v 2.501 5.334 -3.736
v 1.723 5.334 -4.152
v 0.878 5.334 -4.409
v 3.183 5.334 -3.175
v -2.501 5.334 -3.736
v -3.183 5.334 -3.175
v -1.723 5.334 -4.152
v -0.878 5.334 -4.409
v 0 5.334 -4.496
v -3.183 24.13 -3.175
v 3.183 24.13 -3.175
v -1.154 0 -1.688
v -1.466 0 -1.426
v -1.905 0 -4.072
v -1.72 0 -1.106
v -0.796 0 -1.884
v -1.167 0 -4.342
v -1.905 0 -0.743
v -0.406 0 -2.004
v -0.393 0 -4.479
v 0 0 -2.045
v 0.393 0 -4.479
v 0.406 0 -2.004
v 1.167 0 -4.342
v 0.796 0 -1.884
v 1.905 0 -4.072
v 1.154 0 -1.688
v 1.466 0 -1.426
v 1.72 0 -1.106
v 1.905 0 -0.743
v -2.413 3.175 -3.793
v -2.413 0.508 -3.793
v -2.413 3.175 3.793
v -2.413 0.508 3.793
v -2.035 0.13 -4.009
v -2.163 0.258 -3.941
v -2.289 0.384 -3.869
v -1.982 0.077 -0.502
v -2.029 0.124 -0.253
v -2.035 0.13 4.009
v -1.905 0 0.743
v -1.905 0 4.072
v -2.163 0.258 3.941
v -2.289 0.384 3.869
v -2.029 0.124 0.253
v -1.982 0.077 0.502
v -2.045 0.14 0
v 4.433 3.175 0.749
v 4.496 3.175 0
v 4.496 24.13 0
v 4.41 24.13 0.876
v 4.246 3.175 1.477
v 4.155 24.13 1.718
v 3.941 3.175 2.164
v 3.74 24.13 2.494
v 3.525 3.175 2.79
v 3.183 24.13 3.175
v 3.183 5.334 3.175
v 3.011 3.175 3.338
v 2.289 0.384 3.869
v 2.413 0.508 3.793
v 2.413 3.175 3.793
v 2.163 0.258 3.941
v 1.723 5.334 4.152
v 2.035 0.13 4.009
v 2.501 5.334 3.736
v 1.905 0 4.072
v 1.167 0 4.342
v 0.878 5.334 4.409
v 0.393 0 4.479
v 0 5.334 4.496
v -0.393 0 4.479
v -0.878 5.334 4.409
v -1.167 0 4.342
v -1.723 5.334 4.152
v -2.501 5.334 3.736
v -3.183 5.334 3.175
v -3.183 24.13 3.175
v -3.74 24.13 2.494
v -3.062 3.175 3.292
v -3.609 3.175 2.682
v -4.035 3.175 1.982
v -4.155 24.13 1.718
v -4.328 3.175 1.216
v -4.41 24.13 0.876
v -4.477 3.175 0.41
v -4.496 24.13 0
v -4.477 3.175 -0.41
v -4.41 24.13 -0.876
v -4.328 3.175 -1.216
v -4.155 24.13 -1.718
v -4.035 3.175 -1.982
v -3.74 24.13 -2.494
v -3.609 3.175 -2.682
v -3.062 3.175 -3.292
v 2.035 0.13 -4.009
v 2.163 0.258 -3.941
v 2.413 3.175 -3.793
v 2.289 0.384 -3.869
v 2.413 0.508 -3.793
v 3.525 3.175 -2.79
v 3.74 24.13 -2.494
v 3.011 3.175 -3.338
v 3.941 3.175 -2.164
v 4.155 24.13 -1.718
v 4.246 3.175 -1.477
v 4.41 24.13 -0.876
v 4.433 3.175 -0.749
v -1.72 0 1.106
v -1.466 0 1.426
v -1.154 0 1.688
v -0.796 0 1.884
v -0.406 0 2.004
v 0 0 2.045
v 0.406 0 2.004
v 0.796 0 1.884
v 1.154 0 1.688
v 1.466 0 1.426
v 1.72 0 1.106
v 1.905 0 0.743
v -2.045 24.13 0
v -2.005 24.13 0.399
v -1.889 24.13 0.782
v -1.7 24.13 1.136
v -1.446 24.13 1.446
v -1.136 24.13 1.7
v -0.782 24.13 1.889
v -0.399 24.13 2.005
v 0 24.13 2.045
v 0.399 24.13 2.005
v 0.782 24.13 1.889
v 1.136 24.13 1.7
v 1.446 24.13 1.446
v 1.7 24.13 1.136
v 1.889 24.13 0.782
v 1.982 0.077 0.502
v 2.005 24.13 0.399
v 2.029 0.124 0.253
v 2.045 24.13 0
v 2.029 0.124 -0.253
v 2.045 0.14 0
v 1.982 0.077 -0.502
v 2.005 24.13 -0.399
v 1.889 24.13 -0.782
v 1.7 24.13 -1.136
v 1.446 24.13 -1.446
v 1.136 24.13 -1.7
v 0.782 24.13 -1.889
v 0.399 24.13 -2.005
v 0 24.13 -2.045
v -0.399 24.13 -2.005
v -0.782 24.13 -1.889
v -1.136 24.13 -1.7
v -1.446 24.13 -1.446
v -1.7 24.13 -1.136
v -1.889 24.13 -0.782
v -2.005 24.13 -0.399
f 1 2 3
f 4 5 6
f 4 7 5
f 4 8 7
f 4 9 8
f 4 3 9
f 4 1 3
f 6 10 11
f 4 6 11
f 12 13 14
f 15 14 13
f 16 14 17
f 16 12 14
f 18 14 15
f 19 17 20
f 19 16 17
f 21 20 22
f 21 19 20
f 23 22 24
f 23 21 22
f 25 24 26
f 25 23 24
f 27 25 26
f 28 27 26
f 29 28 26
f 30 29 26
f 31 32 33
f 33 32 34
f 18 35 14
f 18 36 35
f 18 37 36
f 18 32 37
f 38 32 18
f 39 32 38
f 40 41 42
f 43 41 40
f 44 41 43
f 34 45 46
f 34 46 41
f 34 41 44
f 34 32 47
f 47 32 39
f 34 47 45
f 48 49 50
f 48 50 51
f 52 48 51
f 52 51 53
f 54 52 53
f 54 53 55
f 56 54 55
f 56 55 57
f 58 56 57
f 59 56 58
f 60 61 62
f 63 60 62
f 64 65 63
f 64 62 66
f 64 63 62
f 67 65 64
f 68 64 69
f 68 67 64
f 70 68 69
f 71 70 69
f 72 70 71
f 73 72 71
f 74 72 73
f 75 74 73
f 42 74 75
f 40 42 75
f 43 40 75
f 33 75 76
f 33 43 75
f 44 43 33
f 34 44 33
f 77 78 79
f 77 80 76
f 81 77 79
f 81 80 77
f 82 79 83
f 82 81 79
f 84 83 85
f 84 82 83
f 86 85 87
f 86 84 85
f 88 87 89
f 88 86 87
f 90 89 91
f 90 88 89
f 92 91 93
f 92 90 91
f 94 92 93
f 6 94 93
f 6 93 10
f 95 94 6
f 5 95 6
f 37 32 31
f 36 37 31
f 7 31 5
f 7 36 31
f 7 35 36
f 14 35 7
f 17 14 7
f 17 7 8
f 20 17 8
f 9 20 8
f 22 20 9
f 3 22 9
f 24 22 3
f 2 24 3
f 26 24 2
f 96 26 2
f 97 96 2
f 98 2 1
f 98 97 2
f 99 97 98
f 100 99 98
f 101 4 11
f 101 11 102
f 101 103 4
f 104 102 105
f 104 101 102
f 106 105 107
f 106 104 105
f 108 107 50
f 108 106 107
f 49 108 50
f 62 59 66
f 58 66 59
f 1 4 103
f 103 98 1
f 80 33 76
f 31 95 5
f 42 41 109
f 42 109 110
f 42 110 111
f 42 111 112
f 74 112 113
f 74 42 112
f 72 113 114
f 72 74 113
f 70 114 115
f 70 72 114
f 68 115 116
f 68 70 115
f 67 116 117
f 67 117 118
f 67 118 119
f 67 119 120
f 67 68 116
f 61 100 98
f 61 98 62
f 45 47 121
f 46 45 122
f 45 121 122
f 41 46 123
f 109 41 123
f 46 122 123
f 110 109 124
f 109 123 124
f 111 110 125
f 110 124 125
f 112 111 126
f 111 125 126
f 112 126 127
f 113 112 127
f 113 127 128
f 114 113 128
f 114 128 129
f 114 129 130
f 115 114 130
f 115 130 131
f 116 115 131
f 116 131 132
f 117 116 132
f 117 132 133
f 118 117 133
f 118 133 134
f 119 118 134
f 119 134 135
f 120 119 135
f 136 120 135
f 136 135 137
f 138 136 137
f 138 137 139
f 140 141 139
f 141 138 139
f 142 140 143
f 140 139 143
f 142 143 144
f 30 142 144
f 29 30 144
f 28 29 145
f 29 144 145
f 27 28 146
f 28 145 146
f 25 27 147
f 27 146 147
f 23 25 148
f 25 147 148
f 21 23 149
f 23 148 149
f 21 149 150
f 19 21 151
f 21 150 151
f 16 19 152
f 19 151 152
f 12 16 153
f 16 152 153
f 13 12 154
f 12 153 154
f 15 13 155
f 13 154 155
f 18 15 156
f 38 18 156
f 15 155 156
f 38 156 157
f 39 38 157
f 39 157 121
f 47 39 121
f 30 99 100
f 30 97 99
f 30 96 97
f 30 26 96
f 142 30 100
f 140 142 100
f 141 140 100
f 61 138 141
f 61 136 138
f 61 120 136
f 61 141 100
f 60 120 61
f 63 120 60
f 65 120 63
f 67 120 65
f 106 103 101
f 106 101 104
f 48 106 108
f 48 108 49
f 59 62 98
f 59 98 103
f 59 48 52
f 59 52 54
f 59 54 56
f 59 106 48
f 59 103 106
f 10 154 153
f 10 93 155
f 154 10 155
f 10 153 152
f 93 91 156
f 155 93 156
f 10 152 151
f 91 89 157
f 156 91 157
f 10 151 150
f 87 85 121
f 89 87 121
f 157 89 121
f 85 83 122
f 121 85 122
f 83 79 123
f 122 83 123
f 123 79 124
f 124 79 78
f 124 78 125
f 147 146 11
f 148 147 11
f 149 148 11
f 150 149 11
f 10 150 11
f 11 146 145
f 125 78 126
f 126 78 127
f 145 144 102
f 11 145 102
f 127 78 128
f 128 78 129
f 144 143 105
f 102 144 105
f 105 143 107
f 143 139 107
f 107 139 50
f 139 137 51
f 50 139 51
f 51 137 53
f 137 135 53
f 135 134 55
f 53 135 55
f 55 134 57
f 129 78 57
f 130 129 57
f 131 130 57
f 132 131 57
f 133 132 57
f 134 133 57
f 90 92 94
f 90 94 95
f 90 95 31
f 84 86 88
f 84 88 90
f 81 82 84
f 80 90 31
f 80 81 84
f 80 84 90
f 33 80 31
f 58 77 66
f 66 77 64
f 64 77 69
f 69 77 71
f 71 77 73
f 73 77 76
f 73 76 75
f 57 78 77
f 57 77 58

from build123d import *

# Parameters (mm, degrees)
F0_R     = 4.4958
F1_DEPTH = 24.13
F3_W     = 6.35
F3_H     = 21.166668
F4_DEPTH = 5.715
F5_SIZE  = 0.508
F7_W     = 18.438894
F7_H     = 4.169167
F8_DEPTH = 21.336
F10_D    = 4.0894


with BuildPart() as f1:
    # F0 (on Front) → F1 (new body)
    with BuildSketch(Plane.XZ):
        Circle(F0_R)
    extrude(amount=-F1_DEPTH)

    # F3 (on offset) → F4 (cut)
    with BuildSketch(Plane.XZ.offset(2.54)):
        with Locations((-5.588, -0.807043)):
            Rectangle(F3_W, F3_H)
        with Locations((5.588, -0.807043)):
            Rectangle(F3_W, F3_H)
    extrude(amount=-F4_DEPTH, mode=Mode.SUBTRACT)

    # F5
    f5_edges = [f1.edges().sort_by_distance(p)[0] for p in [
        (-2.413, 0, 0),
        (2.413, 0, 0),
    ]]
    chamfer(f5_edges, length=F5_SIZE)

    # F7 (on offset) → F8 (cut)
    with BuildSketch(Plane(origin=(0, 26.67, 0), x_dir=(1, 0, 0), z_dir=(0, 1, 0))):
        with Locations((-0.012653, 5.259583)):
            Rectangle(F7_W, F7_H)
        with Locations((-0.012653, -5.259583)):
            Rectangle(F7_W, F7_H)
    extrude(amount=-F8_DEPTH, mode=Mode.SUBTRACT)

    # F10 (through all)
    with Locations(Plane.XZ):
        with Locations((0, 0)):
            Hole(F10_D / 2)


solid = f1.part
